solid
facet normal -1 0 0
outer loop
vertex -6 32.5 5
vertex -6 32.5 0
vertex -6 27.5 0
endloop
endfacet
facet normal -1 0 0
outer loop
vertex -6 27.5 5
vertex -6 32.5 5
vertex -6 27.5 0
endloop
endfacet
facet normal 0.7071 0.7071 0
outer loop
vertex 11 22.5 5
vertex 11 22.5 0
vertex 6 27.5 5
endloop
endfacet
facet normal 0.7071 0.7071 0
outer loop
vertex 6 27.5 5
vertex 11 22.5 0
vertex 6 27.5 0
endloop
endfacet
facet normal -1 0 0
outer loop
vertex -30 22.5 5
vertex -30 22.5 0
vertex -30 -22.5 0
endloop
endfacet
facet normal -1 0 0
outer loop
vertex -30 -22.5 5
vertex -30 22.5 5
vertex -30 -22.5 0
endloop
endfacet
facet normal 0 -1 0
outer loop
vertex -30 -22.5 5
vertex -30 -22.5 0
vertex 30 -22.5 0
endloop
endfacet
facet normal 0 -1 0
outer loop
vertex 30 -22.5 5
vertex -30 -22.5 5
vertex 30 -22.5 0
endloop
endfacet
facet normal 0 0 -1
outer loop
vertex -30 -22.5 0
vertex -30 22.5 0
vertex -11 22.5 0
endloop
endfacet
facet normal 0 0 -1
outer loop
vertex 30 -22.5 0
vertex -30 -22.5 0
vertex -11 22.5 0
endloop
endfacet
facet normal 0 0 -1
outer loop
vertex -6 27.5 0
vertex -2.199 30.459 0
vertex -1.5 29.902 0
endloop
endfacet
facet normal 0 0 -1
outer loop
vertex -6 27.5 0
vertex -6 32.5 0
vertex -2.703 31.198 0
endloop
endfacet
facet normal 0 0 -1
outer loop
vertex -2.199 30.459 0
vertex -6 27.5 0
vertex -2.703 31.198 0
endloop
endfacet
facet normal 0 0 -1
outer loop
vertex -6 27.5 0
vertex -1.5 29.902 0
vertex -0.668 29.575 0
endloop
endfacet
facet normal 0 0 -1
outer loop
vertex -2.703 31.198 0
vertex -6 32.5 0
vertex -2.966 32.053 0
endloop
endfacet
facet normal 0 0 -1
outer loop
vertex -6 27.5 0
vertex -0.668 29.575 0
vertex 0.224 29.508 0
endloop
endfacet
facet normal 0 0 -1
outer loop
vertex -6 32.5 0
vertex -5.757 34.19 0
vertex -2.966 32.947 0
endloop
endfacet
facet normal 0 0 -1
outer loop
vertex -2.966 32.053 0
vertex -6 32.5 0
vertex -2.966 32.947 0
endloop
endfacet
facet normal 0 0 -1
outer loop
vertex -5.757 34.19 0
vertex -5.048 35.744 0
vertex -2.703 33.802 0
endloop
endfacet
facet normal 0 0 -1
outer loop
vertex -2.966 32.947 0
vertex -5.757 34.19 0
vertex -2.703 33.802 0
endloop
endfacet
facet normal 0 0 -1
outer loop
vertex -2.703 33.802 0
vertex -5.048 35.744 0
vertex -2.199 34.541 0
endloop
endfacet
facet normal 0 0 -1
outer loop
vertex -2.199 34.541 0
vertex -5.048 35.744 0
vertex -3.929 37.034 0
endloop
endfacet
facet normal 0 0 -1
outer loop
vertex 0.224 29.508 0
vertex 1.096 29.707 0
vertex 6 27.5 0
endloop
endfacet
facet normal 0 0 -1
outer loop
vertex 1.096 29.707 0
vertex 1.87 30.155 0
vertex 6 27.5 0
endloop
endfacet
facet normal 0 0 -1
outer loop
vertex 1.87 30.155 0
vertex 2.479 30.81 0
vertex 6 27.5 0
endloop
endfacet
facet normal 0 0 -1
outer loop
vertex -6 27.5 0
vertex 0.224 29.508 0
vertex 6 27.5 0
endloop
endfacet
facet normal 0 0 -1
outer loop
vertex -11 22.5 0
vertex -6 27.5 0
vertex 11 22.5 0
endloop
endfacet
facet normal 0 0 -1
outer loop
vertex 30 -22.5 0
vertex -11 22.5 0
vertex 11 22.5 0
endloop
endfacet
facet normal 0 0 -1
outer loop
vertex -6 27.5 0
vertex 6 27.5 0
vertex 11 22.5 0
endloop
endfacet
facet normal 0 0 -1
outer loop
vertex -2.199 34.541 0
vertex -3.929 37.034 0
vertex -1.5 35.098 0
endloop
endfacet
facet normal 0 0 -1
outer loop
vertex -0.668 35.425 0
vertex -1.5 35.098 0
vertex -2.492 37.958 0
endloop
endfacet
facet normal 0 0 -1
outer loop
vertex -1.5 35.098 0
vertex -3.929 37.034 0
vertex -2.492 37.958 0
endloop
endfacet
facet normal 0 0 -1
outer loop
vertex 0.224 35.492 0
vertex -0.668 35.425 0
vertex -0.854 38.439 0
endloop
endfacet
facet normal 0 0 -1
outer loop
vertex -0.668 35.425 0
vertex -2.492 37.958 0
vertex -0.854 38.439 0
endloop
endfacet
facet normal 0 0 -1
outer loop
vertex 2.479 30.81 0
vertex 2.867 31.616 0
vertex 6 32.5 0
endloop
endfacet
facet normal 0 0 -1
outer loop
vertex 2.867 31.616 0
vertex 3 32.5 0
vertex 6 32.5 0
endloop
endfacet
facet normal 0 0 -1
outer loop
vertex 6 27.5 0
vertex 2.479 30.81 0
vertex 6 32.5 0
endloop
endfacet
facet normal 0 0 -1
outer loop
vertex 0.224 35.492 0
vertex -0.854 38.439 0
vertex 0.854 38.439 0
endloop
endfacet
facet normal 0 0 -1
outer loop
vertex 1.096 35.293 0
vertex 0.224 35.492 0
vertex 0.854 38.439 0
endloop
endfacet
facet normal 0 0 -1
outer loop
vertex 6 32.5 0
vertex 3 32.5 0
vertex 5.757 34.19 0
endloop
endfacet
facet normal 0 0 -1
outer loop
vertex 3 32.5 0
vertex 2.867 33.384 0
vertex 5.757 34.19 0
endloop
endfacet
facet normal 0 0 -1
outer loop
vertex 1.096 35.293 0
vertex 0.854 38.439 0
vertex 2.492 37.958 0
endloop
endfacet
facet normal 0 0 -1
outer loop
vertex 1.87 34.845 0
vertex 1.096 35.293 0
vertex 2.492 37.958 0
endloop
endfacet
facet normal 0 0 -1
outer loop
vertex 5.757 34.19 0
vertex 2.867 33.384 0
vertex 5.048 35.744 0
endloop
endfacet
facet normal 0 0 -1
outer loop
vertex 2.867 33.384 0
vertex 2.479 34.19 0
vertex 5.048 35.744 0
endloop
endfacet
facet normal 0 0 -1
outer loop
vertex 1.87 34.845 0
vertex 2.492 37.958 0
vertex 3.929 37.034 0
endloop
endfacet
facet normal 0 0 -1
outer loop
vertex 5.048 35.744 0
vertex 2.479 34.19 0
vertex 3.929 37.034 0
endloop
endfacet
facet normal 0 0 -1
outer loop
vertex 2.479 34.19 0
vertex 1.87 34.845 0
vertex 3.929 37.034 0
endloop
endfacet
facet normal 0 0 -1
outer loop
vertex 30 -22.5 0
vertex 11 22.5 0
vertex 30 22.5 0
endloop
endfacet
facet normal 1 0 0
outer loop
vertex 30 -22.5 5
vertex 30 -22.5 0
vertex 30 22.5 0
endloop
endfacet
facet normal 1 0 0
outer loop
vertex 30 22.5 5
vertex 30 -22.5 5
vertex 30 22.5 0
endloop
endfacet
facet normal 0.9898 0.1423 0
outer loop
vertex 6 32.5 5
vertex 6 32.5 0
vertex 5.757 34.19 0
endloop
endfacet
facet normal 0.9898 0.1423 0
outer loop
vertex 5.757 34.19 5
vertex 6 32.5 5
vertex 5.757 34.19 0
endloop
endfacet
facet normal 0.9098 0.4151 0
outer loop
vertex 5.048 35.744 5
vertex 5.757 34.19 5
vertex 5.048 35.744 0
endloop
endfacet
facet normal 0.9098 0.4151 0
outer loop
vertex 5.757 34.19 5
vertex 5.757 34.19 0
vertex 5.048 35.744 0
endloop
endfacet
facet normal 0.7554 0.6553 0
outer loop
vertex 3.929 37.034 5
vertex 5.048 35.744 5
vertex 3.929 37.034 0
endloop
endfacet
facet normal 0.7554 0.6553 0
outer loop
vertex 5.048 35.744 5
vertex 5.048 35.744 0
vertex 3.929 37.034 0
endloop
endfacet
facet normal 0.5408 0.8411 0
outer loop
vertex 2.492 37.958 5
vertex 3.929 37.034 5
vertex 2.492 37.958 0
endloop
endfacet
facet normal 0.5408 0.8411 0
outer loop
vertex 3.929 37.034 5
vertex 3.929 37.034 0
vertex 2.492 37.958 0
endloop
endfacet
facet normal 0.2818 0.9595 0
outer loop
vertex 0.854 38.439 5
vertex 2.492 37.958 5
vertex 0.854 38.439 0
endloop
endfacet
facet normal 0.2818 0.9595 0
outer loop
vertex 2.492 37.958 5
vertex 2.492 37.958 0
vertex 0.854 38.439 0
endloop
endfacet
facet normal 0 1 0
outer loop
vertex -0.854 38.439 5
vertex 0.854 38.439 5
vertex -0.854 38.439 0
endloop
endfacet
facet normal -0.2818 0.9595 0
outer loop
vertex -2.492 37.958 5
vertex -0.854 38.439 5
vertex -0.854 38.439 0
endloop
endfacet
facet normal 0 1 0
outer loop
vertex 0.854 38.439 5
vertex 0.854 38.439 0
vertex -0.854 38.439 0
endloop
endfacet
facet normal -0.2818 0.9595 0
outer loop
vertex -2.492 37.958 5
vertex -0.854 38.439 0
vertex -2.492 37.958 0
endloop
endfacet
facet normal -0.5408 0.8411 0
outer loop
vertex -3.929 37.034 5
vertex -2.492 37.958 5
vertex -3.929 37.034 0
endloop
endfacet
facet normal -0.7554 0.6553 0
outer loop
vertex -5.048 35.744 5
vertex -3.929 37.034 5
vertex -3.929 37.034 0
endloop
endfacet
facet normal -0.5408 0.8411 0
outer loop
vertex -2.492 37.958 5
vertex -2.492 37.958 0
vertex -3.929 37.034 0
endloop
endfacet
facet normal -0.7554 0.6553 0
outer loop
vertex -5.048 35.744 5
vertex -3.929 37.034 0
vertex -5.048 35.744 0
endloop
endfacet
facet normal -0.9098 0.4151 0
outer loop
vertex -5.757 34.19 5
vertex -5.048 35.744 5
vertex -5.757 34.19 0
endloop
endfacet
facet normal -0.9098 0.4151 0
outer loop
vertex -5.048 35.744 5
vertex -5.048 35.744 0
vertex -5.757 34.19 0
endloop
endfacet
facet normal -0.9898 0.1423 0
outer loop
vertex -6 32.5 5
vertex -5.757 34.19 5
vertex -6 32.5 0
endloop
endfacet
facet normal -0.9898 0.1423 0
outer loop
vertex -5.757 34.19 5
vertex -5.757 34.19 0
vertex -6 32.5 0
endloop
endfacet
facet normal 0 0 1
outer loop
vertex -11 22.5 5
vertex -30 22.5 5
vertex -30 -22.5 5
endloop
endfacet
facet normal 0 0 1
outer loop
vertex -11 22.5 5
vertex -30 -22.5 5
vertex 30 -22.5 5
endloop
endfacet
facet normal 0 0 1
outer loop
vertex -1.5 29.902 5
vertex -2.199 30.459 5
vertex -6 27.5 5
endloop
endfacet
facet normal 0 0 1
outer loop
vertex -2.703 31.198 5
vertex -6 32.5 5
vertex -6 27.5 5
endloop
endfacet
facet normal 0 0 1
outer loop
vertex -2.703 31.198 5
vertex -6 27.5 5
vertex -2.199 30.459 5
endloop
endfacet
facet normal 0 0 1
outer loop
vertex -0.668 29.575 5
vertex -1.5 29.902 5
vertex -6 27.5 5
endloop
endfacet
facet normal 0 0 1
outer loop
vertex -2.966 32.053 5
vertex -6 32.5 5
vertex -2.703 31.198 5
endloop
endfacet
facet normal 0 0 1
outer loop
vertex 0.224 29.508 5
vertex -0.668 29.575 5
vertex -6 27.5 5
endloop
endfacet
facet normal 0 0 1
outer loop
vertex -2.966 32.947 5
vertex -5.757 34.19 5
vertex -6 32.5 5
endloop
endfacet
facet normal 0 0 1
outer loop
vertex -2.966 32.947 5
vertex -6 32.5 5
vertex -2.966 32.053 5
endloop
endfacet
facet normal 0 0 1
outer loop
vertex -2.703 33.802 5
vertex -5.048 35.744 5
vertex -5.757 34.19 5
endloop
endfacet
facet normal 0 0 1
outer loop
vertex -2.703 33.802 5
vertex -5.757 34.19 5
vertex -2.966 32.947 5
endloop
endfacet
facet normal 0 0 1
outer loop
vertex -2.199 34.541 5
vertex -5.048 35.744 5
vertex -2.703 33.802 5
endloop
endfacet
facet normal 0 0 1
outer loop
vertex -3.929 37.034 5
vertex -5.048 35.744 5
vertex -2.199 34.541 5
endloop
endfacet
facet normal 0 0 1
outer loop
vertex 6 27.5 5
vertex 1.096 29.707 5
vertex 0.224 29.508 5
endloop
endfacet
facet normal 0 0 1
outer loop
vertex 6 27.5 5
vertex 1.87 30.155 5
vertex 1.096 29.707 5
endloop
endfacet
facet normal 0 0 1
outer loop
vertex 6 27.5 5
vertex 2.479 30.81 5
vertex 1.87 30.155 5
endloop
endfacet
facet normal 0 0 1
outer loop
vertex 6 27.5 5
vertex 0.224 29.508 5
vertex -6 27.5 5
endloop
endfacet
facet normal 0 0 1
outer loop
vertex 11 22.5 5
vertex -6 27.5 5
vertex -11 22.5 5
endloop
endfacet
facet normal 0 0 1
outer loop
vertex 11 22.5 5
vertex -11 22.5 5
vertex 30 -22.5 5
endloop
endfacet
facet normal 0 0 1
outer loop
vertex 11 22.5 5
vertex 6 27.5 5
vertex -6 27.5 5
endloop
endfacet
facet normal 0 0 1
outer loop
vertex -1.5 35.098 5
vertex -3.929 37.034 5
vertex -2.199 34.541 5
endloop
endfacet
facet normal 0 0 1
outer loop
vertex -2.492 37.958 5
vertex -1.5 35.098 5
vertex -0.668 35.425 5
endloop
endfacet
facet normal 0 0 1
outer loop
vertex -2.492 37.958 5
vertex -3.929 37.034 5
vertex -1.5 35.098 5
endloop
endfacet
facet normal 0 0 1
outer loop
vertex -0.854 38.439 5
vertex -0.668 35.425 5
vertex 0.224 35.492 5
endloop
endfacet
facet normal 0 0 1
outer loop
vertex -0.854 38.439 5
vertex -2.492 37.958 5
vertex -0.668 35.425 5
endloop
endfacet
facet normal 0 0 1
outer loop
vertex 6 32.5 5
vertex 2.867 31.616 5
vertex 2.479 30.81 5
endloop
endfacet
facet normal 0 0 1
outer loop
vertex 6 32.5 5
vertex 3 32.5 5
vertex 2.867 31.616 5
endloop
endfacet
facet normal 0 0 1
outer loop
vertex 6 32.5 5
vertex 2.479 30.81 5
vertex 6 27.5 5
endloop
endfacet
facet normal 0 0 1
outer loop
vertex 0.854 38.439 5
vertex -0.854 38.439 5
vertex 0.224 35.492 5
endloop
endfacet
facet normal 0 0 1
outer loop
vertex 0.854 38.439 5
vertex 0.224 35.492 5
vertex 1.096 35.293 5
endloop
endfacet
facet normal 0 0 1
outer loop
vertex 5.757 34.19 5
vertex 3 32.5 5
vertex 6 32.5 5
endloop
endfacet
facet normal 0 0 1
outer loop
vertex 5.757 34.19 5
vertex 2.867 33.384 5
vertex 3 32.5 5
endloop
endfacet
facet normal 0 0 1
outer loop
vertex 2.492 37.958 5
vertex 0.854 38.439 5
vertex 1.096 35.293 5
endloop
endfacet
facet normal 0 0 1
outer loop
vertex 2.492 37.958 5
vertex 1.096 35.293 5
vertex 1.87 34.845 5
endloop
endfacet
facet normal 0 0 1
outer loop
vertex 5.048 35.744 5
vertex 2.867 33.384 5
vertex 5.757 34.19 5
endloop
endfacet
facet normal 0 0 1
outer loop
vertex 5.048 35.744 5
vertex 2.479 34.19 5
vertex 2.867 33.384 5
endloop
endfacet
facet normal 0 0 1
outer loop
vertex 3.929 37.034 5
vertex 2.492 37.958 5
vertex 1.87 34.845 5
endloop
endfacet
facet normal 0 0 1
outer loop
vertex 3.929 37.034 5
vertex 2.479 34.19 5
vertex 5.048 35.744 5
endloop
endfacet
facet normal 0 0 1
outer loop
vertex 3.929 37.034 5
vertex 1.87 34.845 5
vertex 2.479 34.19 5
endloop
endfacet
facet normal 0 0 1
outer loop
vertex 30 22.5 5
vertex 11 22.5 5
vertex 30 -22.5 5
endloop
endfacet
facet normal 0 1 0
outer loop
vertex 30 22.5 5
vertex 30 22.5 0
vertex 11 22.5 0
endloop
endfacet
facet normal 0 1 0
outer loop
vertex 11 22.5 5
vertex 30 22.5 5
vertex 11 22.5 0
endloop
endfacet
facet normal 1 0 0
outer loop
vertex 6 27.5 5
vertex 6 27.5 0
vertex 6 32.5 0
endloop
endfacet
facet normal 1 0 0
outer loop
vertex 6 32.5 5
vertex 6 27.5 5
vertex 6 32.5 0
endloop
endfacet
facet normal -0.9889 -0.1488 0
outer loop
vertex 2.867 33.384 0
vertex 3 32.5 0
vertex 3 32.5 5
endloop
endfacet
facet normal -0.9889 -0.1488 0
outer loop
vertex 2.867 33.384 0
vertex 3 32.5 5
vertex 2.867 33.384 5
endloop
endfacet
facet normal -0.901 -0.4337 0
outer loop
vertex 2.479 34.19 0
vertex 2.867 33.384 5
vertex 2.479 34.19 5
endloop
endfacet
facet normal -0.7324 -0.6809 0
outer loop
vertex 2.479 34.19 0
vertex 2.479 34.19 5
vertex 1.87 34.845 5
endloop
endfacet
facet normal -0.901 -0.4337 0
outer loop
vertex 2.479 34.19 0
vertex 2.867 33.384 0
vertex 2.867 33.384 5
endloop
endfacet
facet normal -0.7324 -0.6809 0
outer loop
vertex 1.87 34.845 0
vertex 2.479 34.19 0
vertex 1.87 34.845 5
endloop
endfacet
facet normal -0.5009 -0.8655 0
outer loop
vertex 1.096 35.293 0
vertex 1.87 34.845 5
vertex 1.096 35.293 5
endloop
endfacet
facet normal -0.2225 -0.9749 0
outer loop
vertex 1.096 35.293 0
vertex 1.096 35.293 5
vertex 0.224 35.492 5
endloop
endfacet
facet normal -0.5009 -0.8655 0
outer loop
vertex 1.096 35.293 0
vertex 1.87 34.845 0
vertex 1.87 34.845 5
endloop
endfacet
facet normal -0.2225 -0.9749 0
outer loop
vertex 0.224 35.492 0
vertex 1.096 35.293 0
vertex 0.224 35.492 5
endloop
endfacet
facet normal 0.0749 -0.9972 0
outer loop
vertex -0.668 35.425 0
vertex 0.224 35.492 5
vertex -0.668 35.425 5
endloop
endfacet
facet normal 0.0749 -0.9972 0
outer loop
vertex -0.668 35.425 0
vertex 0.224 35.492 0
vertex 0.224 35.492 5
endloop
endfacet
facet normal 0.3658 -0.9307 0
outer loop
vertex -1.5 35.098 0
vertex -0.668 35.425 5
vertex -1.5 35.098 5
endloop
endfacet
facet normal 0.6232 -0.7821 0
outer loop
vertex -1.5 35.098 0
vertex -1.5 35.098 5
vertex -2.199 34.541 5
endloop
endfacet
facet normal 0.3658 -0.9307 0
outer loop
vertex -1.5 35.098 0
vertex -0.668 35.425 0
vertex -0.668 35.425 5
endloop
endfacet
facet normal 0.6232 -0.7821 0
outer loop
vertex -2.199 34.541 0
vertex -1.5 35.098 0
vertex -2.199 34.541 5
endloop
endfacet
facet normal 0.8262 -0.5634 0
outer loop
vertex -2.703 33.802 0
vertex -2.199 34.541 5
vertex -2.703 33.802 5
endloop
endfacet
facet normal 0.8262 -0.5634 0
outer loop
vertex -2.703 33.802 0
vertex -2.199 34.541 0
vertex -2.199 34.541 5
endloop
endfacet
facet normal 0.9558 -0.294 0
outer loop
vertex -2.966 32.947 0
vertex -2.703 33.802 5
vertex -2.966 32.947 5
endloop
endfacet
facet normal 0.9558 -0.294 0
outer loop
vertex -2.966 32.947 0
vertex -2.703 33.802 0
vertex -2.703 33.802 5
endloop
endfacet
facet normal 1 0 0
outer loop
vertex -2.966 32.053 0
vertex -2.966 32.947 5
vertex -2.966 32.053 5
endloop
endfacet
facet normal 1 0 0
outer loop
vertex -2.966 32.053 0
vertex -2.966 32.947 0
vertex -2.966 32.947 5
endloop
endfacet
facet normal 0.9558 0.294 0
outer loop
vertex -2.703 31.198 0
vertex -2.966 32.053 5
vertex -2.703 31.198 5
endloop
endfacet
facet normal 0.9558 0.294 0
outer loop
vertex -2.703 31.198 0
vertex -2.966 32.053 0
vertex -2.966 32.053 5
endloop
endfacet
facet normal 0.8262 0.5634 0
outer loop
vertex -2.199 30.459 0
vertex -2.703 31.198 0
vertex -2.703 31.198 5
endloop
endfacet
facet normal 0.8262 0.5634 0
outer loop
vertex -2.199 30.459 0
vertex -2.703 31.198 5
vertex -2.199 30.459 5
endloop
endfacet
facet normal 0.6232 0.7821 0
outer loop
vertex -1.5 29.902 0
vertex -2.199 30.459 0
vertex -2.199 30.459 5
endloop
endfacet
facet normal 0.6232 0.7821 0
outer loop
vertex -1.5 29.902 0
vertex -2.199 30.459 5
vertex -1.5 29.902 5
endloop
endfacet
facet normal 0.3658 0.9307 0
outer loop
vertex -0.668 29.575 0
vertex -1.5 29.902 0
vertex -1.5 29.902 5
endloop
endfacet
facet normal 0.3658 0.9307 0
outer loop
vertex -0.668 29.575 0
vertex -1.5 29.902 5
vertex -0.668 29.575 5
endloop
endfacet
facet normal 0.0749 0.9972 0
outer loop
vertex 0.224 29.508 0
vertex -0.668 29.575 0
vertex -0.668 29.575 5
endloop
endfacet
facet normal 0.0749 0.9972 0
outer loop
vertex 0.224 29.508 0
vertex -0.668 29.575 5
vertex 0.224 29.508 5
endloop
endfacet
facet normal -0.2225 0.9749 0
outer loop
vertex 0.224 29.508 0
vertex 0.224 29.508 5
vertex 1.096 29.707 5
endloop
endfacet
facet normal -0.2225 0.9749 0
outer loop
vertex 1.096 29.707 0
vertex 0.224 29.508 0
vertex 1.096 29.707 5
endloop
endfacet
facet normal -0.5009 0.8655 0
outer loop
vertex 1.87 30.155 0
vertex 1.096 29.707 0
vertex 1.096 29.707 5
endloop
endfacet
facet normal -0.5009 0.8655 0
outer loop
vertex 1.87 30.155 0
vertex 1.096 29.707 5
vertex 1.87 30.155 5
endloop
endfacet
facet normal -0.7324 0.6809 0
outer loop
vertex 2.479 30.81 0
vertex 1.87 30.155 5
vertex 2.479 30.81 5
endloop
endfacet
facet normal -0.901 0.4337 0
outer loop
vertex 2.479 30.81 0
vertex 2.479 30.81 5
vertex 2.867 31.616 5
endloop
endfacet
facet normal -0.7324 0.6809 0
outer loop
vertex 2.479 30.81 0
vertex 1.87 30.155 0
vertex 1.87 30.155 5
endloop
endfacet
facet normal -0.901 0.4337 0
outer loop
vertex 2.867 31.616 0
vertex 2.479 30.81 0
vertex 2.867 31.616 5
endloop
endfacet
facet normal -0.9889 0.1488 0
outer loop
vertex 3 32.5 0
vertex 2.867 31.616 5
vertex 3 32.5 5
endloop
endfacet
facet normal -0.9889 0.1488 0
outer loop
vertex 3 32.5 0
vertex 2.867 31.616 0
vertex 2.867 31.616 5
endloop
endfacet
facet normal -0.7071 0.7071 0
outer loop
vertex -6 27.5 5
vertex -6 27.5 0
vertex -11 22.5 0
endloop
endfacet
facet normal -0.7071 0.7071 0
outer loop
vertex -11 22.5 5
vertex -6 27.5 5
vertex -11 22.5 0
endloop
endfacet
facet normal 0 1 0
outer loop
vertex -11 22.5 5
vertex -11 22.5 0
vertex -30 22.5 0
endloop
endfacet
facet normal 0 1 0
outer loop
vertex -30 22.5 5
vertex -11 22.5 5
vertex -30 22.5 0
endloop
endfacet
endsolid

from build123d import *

# Parameters (mm, degrees)
F0_R     = 3
F1_DEPTH = 5


with BuildPart() as f1:
    # F0 (on Top) → F1 (new body)
    with BuildSketch(Plane.XY):
        Polygon((30, -22.5), (30, 22.5), (11, 22.5), (6, 22.5), (-6, 22.5), (-11, 22.5), (-30, 22.5), (-30, -22.5), align=None)
        Polygon((-11, 22.5), (-6, 22.5), (-6, 27.5), align=None)
        with BuildLine():
            Line((-6, 22.5), (6, 22.5))
            Line((6, 22.5), (6, 27.5))
            Line((6, 27.5), (6, 32.5))
            ThreePointArc((6, 32.5), (0, 38.5), (-6, 32.5))
            Line((-6, 32.5), (-6, 27.5))
            Line((-6, 27.5), (-6, 22.5))
        make_face()
        with Locations((0, 32.5)):
            Circle(F0_R, mode=Mode.SUBTRACT)
        Polygon((6, 22.5), (11, 22.5), (6, 27.5), align=None)
    extrude(amount=F1_DEPTH)


solid = f1.part
